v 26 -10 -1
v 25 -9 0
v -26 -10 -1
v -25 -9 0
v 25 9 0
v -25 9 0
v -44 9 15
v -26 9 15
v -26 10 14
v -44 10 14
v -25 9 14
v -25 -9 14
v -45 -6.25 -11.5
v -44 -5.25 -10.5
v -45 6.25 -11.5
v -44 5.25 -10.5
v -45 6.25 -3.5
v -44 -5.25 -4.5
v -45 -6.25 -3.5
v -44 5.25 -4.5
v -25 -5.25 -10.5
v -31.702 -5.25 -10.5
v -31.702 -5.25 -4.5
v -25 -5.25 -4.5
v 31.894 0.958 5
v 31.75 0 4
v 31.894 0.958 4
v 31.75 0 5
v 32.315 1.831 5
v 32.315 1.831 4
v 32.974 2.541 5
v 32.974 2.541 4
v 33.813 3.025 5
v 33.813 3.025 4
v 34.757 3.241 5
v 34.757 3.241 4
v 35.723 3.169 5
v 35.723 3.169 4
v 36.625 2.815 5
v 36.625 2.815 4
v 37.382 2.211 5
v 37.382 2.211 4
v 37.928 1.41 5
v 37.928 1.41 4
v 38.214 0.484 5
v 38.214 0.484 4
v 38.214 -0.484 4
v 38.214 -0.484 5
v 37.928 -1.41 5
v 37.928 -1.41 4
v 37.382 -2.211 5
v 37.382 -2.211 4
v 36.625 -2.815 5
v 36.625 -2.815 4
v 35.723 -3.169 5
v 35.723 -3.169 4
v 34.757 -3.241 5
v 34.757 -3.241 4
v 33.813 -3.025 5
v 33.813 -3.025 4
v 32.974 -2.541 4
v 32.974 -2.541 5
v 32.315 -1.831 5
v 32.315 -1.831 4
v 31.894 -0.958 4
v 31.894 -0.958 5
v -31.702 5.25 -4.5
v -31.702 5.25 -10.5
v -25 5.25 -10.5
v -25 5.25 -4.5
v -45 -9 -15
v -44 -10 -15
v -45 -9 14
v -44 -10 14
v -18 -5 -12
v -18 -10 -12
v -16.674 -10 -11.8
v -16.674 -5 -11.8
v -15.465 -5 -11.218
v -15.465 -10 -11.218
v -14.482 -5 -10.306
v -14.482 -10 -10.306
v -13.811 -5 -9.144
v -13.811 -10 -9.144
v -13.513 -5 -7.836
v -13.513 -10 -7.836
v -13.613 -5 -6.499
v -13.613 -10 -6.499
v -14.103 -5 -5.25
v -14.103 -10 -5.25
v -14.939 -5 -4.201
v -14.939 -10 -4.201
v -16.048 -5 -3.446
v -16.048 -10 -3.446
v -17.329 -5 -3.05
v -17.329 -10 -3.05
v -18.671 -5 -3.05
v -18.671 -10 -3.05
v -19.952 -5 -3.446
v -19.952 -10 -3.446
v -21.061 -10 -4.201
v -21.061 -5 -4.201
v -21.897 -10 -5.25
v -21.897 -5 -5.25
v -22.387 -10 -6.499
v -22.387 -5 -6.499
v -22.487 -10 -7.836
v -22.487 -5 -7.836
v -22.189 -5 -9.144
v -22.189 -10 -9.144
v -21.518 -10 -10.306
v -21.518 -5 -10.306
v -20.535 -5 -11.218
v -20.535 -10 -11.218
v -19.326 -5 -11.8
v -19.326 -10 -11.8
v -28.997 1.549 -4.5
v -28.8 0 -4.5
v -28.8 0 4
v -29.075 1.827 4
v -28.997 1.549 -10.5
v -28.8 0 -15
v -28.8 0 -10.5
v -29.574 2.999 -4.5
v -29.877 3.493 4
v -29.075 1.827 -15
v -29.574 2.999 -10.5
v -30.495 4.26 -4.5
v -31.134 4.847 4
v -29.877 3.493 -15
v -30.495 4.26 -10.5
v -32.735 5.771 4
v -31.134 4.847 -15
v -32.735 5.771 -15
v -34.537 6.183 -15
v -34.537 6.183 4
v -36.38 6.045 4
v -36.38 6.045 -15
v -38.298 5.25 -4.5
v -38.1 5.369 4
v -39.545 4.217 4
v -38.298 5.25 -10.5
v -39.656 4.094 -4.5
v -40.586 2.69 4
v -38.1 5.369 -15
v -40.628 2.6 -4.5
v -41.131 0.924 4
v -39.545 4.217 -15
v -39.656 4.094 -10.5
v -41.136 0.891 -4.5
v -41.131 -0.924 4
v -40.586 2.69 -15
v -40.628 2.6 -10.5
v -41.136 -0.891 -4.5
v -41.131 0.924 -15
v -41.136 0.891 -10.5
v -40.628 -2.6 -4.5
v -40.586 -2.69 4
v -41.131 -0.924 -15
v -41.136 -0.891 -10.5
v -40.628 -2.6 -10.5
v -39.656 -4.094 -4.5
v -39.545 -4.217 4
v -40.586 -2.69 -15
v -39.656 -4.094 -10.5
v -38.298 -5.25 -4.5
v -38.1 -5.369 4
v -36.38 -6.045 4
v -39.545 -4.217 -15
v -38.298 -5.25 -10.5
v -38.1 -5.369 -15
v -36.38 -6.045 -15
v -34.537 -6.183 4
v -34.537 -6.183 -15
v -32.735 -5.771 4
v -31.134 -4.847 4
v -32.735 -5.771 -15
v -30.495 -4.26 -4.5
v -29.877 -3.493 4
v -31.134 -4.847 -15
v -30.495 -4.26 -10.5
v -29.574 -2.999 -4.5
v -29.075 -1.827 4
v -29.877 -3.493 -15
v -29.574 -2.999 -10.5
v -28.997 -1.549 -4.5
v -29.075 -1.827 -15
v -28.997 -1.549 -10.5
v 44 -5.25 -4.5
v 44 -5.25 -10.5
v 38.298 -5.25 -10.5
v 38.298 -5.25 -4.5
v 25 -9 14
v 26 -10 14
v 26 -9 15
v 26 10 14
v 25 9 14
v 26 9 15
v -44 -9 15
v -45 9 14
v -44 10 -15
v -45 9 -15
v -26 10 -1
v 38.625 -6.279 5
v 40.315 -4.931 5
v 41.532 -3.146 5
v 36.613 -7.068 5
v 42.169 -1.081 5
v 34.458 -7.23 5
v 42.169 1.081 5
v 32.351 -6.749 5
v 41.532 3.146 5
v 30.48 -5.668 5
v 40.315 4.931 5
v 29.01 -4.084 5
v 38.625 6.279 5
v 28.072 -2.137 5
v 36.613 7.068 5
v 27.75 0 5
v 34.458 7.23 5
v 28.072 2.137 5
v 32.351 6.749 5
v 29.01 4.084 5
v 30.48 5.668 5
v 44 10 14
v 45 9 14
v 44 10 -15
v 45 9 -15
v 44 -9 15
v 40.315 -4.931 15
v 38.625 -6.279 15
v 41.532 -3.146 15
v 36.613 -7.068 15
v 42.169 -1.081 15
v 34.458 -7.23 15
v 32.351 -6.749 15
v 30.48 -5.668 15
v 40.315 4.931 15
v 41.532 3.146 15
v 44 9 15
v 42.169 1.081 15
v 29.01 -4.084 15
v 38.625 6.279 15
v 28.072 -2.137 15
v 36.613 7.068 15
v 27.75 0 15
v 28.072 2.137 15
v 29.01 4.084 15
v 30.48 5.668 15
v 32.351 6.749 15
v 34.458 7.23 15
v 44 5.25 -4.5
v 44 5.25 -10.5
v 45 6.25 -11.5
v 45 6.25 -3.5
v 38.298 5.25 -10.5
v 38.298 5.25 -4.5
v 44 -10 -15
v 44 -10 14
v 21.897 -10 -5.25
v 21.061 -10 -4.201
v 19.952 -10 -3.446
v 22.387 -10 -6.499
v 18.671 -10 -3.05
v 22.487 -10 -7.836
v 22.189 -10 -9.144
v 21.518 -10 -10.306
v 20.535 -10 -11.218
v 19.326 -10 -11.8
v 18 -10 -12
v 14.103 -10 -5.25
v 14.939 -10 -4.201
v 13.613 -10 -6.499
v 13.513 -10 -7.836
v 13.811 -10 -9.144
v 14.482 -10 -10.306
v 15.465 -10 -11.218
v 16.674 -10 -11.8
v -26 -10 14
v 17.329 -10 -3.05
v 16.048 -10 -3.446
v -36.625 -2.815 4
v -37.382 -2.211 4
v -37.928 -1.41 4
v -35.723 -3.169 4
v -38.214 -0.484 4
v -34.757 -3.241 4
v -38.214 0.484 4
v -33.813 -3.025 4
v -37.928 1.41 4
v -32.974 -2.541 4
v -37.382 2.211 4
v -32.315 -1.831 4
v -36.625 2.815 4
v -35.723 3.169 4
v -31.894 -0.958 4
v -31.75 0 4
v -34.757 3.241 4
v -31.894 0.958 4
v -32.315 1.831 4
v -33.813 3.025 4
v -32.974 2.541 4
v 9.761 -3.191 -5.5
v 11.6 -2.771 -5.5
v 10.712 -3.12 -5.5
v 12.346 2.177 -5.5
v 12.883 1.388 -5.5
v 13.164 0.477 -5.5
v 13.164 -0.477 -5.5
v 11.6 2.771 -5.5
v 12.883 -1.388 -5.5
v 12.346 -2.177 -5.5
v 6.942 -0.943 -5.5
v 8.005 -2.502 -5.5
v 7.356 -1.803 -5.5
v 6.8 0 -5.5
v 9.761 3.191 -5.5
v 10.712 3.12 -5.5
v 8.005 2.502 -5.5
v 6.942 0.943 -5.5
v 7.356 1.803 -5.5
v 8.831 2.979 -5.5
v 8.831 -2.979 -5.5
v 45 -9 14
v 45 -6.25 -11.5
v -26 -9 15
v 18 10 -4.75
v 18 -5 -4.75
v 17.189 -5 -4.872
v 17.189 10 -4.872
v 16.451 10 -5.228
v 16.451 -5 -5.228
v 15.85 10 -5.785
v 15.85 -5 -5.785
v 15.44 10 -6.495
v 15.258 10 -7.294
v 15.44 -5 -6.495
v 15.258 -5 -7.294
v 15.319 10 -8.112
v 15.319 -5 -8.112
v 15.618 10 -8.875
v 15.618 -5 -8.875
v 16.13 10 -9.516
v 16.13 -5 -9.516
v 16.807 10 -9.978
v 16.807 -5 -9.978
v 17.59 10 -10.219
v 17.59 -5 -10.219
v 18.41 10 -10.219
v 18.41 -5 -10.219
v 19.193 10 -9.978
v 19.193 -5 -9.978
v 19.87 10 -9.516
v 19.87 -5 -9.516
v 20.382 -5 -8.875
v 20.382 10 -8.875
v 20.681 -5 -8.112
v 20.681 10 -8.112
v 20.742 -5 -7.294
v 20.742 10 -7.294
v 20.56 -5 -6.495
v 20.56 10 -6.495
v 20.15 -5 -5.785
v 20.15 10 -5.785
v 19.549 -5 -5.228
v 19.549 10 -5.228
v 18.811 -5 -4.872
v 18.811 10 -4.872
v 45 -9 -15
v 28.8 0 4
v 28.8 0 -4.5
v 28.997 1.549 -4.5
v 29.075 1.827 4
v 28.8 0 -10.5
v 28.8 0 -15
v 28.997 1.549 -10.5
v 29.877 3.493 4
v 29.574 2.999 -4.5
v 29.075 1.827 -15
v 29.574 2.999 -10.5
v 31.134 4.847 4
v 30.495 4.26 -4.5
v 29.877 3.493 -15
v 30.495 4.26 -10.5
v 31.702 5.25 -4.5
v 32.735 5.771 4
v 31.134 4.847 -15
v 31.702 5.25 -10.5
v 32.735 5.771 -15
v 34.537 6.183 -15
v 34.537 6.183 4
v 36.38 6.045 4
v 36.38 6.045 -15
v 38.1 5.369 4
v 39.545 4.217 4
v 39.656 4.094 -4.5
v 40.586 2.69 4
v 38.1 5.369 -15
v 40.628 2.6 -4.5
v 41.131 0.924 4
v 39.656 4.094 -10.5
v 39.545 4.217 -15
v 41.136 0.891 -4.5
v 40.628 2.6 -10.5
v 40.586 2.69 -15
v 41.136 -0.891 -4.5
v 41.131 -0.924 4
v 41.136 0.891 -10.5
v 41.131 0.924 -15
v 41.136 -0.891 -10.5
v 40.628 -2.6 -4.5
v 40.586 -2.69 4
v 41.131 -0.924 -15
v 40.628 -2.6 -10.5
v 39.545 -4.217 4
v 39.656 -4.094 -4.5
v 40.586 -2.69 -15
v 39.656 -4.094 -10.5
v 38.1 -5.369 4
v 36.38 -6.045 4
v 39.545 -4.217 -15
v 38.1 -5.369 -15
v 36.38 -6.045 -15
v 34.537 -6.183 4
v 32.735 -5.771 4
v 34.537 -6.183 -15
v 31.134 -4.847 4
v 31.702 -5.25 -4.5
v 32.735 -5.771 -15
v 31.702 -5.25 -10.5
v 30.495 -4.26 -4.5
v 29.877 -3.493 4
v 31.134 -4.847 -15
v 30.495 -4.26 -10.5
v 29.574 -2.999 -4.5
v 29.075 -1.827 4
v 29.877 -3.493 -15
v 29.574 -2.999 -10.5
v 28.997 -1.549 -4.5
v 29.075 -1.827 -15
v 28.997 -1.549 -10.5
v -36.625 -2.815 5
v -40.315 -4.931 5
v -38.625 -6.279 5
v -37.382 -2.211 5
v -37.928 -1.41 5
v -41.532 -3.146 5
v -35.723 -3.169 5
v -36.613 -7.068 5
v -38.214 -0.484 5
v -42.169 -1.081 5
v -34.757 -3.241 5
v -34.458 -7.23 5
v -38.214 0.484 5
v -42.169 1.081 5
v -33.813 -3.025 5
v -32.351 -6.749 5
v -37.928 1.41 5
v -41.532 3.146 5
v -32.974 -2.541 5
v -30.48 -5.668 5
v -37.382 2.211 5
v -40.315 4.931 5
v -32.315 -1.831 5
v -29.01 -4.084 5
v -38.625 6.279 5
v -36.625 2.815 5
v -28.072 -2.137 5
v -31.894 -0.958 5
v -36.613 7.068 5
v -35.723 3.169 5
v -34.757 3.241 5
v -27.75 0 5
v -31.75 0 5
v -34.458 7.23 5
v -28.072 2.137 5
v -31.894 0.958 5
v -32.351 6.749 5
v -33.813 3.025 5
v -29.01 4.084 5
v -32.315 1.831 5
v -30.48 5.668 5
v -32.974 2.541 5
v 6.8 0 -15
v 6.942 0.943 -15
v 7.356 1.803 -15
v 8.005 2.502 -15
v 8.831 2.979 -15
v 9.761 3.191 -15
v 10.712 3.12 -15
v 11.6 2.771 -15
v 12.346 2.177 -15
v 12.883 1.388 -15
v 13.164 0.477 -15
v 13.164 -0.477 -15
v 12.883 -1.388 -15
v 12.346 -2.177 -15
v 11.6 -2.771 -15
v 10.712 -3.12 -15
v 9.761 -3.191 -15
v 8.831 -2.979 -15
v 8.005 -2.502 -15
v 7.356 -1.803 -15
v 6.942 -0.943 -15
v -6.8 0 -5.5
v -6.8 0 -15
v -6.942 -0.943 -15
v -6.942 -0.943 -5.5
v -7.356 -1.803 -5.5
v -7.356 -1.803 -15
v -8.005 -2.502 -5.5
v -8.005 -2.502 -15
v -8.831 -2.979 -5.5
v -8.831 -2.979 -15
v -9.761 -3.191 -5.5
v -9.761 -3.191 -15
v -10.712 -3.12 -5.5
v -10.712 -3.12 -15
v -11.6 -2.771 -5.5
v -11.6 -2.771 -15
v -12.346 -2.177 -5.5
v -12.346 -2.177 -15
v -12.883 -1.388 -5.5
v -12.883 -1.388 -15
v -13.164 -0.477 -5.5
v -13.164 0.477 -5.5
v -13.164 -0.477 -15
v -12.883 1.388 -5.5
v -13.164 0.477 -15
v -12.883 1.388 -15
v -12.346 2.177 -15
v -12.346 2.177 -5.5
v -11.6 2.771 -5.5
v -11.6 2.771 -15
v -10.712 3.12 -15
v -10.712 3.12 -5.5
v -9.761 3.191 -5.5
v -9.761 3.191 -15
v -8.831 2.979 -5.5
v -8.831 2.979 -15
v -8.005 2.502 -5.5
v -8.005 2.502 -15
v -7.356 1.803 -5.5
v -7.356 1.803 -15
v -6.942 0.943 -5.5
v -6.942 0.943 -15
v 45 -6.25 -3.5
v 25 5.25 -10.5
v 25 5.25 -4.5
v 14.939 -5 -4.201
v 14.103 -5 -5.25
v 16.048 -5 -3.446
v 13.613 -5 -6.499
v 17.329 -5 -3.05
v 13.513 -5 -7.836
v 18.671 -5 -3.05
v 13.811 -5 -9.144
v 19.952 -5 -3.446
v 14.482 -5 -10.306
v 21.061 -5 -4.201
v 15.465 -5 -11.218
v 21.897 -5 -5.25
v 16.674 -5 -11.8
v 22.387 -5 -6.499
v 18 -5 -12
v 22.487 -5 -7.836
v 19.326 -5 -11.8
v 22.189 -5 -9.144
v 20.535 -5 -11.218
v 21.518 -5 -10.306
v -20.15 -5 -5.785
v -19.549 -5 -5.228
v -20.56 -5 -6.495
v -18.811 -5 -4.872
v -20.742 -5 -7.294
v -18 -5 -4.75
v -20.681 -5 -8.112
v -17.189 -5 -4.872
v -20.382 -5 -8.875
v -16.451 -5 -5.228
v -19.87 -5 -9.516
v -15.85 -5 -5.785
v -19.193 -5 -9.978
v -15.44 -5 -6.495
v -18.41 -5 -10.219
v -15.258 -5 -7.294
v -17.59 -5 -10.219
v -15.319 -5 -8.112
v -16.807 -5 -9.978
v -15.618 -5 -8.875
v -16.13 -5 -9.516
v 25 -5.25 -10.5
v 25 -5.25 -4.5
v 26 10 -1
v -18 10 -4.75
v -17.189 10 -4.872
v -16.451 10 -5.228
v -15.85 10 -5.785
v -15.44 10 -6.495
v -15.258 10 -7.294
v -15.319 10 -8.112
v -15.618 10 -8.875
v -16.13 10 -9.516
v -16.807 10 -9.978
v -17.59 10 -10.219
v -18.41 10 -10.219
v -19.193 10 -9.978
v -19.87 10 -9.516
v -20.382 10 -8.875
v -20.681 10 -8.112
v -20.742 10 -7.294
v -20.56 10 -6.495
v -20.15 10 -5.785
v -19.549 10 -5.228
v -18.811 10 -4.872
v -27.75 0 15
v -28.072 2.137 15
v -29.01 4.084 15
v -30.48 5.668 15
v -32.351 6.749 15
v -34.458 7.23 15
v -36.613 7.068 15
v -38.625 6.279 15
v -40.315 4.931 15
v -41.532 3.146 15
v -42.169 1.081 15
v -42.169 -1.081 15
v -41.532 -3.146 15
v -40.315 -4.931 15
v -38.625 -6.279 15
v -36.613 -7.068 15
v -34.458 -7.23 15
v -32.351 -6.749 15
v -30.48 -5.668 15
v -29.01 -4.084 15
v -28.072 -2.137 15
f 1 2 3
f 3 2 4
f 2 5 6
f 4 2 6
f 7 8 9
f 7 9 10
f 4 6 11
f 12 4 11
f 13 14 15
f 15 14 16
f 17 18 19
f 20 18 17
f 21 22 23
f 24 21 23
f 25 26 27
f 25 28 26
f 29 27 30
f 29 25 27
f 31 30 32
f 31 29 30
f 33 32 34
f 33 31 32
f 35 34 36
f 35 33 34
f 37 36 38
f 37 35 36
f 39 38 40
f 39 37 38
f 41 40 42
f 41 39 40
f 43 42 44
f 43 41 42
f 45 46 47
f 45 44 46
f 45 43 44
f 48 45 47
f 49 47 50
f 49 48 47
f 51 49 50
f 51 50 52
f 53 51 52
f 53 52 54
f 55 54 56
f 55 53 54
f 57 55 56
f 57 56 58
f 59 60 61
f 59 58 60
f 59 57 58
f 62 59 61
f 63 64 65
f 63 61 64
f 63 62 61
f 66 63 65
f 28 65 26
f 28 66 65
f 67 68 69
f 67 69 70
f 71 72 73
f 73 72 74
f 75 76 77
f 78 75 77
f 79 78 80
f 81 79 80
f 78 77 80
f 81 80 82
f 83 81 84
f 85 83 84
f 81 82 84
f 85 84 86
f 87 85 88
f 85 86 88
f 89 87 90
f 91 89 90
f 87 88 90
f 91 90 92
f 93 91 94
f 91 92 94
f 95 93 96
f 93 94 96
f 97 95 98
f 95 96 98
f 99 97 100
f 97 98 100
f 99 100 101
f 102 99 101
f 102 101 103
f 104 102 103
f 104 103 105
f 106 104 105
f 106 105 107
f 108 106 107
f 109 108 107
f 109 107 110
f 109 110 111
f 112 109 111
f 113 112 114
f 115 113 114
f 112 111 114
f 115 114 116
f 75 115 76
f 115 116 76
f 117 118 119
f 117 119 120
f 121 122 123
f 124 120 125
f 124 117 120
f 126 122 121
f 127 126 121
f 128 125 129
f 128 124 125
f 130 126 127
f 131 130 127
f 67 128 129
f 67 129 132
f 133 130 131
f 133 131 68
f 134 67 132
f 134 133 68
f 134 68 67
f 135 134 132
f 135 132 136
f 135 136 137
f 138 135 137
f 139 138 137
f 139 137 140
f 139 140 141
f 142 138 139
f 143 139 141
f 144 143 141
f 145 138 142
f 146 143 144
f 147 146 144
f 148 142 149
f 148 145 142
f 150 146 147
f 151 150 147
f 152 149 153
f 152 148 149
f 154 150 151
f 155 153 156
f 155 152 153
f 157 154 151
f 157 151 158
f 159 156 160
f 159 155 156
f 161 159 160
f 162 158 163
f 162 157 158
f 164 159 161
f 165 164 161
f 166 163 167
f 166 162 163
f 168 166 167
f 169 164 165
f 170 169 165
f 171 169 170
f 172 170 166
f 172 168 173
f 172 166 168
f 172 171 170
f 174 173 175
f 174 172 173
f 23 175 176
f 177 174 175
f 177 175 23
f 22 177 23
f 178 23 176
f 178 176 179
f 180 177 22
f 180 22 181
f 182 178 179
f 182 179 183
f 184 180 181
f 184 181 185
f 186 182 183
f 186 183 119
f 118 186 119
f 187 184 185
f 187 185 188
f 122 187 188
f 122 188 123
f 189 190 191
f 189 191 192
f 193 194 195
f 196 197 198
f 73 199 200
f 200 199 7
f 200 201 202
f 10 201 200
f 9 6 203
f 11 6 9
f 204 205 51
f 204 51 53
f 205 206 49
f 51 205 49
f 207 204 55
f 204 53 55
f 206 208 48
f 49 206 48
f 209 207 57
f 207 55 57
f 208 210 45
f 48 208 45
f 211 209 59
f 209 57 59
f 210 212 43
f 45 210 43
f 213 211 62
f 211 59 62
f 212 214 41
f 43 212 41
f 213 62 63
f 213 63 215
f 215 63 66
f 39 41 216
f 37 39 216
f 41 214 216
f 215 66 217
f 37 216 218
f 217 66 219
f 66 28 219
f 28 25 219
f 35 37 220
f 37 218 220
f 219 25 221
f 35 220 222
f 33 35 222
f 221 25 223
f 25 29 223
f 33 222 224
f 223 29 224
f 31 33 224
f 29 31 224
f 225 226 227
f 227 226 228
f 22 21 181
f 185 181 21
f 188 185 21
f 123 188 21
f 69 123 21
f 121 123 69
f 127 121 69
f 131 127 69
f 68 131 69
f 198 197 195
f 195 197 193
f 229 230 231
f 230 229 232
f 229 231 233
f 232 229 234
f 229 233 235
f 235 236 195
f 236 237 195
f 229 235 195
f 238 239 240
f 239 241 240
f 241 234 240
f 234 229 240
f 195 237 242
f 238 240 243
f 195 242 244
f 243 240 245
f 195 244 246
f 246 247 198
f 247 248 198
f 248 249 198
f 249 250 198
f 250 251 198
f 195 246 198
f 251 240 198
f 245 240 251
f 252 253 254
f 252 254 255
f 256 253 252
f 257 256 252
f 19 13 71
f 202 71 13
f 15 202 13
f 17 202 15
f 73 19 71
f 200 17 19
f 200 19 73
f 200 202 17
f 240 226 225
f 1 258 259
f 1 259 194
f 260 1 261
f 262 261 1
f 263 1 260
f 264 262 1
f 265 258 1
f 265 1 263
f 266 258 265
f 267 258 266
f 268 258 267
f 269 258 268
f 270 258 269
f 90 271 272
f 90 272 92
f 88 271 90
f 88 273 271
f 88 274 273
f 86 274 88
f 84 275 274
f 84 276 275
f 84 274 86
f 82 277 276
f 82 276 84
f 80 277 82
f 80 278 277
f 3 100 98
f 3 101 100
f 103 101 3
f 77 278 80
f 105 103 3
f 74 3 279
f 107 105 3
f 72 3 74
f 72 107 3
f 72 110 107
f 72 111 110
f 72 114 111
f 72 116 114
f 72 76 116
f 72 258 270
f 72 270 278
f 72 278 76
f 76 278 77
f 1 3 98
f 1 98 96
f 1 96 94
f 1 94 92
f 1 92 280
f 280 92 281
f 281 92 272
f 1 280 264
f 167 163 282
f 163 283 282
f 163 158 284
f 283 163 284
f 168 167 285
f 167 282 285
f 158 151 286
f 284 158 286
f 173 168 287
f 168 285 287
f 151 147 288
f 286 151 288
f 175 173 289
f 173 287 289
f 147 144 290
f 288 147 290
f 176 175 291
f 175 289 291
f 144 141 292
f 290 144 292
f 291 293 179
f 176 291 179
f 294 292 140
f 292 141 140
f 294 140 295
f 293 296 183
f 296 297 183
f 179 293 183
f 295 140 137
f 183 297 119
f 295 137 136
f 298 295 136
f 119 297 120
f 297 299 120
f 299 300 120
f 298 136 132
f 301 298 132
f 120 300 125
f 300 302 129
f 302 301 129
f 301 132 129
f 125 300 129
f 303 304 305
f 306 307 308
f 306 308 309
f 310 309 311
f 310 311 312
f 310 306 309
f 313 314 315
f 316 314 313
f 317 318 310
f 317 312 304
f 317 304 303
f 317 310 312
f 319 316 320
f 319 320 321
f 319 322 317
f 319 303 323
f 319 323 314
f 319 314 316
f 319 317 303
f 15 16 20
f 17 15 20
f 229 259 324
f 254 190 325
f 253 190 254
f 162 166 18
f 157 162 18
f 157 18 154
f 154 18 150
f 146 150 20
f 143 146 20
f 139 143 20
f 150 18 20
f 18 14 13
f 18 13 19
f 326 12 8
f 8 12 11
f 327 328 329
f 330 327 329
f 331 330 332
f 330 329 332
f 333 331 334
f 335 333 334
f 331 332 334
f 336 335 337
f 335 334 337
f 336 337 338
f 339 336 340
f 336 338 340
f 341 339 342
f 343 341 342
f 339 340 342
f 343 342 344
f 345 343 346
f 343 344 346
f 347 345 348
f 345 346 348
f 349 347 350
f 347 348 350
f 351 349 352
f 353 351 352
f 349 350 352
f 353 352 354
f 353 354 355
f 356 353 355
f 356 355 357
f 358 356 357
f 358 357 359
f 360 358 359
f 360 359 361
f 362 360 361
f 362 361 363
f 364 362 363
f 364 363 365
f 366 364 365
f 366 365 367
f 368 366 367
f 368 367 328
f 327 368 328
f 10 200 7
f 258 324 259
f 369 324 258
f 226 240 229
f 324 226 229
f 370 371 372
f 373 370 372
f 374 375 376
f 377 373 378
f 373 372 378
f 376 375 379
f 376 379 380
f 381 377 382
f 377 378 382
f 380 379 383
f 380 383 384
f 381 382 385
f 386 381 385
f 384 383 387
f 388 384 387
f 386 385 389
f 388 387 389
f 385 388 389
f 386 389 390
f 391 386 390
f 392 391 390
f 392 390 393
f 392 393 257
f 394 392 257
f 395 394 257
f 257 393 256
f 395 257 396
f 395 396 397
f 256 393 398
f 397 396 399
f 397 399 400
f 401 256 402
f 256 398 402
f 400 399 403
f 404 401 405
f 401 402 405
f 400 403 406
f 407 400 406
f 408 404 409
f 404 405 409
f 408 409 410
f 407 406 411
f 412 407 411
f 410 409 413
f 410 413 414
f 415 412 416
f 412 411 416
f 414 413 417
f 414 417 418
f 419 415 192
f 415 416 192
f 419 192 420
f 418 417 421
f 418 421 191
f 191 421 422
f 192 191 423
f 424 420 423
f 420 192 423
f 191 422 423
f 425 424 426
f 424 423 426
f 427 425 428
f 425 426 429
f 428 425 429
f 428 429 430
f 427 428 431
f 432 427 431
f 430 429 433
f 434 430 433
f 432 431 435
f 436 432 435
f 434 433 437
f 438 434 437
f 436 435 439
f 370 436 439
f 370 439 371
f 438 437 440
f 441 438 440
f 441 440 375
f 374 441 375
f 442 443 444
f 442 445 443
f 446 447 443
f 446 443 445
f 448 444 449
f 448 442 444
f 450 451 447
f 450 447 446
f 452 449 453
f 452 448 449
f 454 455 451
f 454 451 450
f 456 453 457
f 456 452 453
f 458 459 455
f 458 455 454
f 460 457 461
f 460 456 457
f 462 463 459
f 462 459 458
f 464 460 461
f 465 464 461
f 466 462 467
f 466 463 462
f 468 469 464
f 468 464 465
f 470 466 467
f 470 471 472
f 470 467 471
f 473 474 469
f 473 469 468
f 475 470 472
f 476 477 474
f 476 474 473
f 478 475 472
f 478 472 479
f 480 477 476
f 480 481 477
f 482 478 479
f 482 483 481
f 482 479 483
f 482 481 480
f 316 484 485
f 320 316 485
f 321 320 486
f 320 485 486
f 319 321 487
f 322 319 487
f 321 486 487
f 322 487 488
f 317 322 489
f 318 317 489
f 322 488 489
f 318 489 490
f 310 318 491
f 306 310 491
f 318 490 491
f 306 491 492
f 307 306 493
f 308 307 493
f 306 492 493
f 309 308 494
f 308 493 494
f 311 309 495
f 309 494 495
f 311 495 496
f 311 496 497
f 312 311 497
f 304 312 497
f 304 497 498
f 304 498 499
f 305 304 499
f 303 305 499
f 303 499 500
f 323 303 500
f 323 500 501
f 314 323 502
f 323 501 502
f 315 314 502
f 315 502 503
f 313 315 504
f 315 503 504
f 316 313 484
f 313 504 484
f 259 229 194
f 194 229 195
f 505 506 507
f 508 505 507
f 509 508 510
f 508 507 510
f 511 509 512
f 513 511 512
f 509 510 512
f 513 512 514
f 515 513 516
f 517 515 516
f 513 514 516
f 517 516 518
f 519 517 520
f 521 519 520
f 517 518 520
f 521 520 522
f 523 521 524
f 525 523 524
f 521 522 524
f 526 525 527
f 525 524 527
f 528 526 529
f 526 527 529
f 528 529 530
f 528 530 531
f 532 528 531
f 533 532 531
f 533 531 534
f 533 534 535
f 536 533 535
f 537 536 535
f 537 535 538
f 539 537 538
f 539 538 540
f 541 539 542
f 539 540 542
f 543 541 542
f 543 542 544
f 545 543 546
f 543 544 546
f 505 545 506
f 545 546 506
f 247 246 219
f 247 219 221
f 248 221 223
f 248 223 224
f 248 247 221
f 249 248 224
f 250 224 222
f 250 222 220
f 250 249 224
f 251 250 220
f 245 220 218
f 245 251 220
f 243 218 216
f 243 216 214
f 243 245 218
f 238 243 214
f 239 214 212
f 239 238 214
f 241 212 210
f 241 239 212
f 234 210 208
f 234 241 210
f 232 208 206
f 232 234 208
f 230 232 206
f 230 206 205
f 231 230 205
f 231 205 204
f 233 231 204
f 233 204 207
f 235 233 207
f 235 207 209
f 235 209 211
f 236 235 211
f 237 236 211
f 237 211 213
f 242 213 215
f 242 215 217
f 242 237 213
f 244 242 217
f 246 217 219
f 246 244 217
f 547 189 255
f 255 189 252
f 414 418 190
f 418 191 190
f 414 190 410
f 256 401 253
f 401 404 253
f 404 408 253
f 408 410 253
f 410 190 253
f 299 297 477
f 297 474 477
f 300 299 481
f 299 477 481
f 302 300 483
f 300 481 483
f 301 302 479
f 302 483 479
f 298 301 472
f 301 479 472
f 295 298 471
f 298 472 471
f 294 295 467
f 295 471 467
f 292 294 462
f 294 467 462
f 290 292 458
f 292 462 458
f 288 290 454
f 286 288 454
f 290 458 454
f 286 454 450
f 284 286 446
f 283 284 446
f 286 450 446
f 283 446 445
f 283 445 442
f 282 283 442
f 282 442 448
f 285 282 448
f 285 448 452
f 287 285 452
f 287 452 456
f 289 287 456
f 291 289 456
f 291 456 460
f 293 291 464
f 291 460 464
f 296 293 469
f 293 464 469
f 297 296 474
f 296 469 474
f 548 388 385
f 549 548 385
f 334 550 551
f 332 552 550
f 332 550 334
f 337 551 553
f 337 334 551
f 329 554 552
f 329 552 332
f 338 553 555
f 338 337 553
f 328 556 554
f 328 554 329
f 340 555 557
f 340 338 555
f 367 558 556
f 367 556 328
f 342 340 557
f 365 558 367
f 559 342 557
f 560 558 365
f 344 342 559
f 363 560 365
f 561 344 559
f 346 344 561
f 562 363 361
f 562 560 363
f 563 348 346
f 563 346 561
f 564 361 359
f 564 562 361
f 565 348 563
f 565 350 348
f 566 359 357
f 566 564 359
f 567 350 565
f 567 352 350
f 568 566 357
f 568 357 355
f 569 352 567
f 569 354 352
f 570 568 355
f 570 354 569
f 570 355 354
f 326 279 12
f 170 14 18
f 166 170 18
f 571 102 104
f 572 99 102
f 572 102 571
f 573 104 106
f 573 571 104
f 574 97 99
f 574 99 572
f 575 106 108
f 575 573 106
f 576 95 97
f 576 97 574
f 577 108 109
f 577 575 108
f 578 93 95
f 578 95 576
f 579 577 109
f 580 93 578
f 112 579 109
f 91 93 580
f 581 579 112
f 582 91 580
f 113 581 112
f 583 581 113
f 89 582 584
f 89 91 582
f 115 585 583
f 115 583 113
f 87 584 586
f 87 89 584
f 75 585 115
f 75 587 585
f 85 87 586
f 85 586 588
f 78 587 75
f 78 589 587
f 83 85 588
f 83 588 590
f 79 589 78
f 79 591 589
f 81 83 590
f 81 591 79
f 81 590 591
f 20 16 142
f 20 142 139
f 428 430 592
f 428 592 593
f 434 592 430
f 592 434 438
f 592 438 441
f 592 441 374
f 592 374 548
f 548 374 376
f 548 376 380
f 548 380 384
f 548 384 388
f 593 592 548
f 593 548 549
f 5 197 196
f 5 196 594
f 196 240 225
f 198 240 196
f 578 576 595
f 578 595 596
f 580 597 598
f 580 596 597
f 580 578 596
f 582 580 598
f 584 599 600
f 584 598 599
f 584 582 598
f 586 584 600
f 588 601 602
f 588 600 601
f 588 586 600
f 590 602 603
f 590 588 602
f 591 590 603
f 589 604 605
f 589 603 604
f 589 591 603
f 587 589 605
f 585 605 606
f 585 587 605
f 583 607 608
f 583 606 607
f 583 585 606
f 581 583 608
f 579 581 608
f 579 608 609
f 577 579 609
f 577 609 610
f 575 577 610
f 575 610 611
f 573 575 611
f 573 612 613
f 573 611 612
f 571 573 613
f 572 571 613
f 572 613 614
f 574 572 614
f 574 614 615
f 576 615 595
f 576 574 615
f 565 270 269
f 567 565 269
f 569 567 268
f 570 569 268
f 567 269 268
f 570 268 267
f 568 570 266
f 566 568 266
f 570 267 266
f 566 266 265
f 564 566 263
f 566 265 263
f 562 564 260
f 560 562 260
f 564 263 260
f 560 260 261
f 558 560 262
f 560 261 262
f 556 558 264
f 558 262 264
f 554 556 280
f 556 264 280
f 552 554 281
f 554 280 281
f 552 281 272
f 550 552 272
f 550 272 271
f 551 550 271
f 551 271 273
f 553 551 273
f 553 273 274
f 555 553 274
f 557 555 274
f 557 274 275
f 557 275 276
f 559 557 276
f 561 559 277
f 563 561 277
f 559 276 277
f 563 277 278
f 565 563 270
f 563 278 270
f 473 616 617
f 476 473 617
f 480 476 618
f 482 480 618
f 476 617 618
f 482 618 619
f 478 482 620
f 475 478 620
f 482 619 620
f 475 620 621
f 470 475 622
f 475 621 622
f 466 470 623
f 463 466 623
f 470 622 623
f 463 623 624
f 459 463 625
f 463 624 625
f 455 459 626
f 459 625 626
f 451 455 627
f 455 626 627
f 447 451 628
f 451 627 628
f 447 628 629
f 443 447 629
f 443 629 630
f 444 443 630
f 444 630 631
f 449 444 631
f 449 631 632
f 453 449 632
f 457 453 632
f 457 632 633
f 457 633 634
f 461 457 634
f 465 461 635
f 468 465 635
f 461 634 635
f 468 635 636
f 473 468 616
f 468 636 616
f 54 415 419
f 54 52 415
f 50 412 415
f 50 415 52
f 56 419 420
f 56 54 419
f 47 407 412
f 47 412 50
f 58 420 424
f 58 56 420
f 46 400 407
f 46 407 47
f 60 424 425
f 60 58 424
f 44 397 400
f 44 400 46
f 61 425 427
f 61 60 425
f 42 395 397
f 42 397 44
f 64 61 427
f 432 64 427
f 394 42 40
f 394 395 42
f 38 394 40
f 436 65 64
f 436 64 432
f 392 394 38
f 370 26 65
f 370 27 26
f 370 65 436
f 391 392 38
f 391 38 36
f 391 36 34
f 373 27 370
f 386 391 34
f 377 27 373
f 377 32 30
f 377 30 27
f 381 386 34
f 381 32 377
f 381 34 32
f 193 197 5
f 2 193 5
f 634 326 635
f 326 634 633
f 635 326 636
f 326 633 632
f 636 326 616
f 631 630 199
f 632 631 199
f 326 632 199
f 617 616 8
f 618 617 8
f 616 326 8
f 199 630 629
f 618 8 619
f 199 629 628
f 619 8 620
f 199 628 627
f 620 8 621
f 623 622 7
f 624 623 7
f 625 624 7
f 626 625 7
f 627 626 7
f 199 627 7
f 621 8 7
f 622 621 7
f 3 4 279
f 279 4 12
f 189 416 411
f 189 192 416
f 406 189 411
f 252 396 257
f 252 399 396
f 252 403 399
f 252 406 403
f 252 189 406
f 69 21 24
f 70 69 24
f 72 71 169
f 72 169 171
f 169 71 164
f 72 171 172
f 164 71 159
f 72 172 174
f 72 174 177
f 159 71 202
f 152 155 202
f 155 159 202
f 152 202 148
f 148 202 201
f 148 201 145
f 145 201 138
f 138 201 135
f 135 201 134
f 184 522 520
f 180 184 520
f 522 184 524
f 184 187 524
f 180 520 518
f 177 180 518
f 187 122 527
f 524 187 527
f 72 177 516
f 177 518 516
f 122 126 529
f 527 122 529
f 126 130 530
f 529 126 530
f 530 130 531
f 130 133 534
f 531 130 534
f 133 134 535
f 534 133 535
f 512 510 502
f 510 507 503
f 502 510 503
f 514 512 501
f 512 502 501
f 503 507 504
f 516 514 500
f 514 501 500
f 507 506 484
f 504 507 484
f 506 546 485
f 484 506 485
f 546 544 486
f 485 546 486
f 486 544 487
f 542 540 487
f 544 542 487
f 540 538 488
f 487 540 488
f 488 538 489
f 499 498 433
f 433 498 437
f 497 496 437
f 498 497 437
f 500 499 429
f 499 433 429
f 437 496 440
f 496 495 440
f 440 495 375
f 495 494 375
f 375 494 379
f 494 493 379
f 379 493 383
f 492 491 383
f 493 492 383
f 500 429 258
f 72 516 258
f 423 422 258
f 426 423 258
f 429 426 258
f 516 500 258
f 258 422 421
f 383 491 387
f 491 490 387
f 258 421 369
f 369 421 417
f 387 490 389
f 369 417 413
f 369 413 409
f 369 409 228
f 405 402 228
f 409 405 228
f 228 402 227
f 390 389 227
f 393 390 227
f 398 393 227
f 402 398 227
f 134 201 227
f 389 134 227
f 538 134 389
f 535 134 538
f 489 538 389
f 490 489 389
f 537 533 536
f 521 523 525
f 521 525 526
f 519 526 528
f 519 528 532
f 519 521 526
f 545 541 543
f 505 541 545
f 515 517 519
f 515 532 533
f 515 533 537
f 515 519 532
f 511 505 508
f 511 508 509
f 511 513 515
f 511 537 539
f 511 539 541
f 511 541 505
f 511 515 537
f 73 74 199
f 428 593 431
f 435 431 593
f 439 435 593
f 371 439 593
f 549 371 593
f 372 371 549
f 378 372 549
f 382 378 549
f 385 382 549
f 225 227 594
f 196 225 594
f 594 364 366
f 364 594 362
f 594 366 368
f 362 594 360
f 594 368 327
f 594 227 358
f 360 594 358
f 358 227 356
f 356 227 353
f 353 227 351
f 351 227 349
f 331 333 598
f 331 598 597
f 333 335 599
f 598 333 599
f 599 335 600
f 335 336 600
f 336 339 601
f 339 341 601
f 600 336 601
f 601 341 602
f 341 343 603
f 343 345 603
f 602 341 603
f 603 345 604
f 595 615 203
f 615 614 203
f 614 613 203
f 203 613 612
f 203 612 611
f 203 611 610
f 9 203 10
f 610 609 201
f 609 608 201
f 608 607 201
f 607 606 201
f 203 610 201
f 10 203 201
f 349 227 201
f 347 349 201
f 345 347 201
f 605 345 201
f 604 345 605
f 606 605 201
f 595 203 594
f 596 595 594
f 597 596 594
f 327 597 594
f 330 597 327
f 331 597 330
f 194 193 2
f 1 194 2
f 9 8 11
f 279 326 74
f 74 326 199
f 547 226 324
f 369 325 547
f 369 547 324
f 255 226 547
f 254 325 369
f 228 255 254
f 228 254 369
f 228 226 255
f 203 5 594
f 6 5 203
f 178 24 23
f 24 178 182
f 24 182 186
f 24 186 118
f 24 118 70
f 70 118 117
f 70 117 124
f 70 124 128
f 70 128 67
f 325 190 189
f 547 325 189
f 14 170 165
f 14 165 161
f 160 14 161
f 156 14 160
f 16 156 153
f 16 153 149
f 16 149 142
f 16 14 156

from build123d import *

# Parameters (mm, degrees)
BODY_DEPTH               = 10
SKETCH2_R                = 7.25
SPRING_HOLE_DEPTH        = 10
SKETCH3_R                = 3.25
SHAFT_HOLE_DEPTH         = 51.249378106
FIXATION_HOLE_START      = -20
SKETCH4_R                = 2.75
FIXATION_HOLE_DEPTH      = 72.478150705
SKETCH6_W                = 6
SKETCH6_H                = 10.5
NUT_HOLE_DEPTH           = 20
SKETCH7_R                = 3.2
INSERTS_TOP_DEPTH        = 9.5
SKETCH8_R                = 4.5
M5_SCREW_PLACE_DEPTH     = 5
SKETCH9_R                = 6.2
LINEARBEARINGPLACE_DEPTH = 19
CHAMFER1_SIZE            = 1
CHAMFER2_SIZE            = 1


with BuildPart() as part:
    # Sketch1 → Body (new, symmetric)
    with BuildSketch(Plane(origin=(0, 0, 0), x_dir=(1, 0, 0), z_dir=(0, 1, 0))):
        Polygon((-45, 15), (45, 15), (45, -5), (45, -15), (25, -15), (25, 0), (-25, 0), (-25, -15), (-45, -15), (-45, -5), align=None)
    extrude(amount=BODY_DEPTH, both=True)

    # Sketch2 → Spring_Hole (cut)
    with BuildSketch(Plane.XY.offset(15)):
        with Locations((-35, 0)):
            Circle(SKETCH2_R)
    spring_hole = extrude(amount=-SPRING_HOLE_DEPTH, mode=Mode.SUBTRACT)

    # Sketch3 → Shaft_Hole (cut, symmetric)
    with BuildSketch(Plane.XY.offset(5)):
        with Locations((-35, 0)):
            Circle(SKETCH3_R)
    shaft_hole = extrude(amount=SHAFT_HOLE_DEPTH, both=True, mode=Mode.SUBTRACT)

    # Sketch4 → Fixation_Hole (cut, through all)
    with BuildSketch(Plane(origin=(0, 10, 0), x_dir=(1, 0, 0), z_dir=(0, 1, 0)).offset(FIXATION_HOLE_START)):
        with Locations(Location((-18, 7.5, 0), (0, 0, 270))):
            Circle(SKETCH4_R)
    fixation_hole = extrude(amount=FIXATION_HOLE_DEPTH, mode=Mode.SUBTRACT)

    # Sketch6 → Nut_Hole (cut)
    with BuildSketch(Plane.ZY.offset(45)):
        with Locations((-7.5, 0)):
            Rectangle(SKETCH6_W, SKETCH6_H)
    nut_hole = extrude(amount=-NUT_HOLE_DEPTH, mode=Mode.SUBTRACT)

    # Mirror1: Spring_Hole, Shaft_Hole, Fixation_Hole, Nut_Hole across plane
    add(spring_hole.mirror(Plane(origin=(0, 0, 0), x_dir=(0, 0, 1), z_dir=(1, 0, 0))), mode=Mode.SUBTRACT)
    add(shaft_hole.mirror(Plane(origin=(0, 0, 0), x_dir=(0, 0, 1), z_dir=(1, 0, 0))), mode=Mode.SUBTRACT)
    add(fixation_hole.mirror(Plane(origin=(0, 0, 0), x_dir=(0, 0, 1), z_dir=(1, 0, 0))), mode=Mode.SUBTRACT)
    add(nut_hole.mirror(Plane(origin=(0, 0, 0), x_dir=(0, 0, 1), z_dir=(1, 0, 0))), mode=Mode.SUBTRACT)

    # Sketch7 → Inserts_Top (cut)
    with BuildSketch(Plane(origin=(0, 0, -15), x_dir=(-1, 0, 0), z_dir=(0, 0, -1))):
        with Locations((-10, 0)):
            Circle(SKETCH7_R)
        with Locations(Location((10, 0, 0), (0, 0, 180))):
            Circle(SKETCH7_R)
    extrude(amount=-INSERTS_TOP_DEPTH, mode=Mode.SUBTRACT)

    # Sketch8 → M5_Screw_Place (cut)
    with BuildSketch(Plane.XZ.offset(10)):
        with Locations(Location((-18, -7.5, 0), (0, 0, 270))):
            Circle(SKETCH8_R)
        with Locations(Location((18, -7.5, 0), (0, 0, 270))):
            Circle(SKETCH8_R)
    extrude(amount=-M5_SCREW_PLACE_DEPTH, mode=Mode.SUBTRACT)

    # Sketch9 → LinearBearingPlace (cut)
    with BuildSketch(Plane(origin=(0, 0, -15), x_dir=(-1, 0, 0), z_dir=(0, 0, -1))):
        with Locations((-35, 0)):
            Circle(SKETCH9_R)
    linearbearingplace = extrude(amount=-LINEARBEARINGPLACE_DEPTH, mode=Mode.SUBTRACT)

    # Mirror2: LinearBearingPlace across plane
    add(linearbearingplace.mirror(Plane(origin=(0, 0, 0), x_dir=(0, 0, 1), z_dir=(1, 0, 0))), mode=Mode.SUBTRACT)

    # Chamfer1
    chamfer1_edges = [part.edges().sort_by_distance(p)[0] for p in [
        (0, -10, 0),
        (-25, -10, 7.5),
        (-35, -10, 15),
        (-45, -10, 0),
        (45, -10, 0),
        (45, 10, 0),
        (35, -10, 15),
        (25, -10, 7.5),
        (-25, 0, 15),
        (-45, 0, 15),
        (45, 0, 15),
        (25, 0, 15),
        (-45, 10, 0),
        (-35, 10, 15),
        (-25, 10, 7.5),
        (0, 10, 0),
        (25, 10, 7.5),
        (35, 10, 15),
    ]]
    chamfer(chamfer1_edges, length=CHAMFER1_SIZE)

    # Chamfer2
    chamfer2_edges = [part.edges().sort_by_distance(p)[0] for p in [
        (-45, 0, -4.5),
        (-45, 5.25, -7.5),
        (-45, 0, -10.5),
        (-45, -5.25, -7.5),
        (45, 0, -4.5),
        (45, 5.25, -7.5),
        (45, 0, -10.5),
        (45, -5.25, -7.5),
    ]]
    chamfer(chamfer2_edges, length=CHAMFER2_SIZE)


solid = part.part
